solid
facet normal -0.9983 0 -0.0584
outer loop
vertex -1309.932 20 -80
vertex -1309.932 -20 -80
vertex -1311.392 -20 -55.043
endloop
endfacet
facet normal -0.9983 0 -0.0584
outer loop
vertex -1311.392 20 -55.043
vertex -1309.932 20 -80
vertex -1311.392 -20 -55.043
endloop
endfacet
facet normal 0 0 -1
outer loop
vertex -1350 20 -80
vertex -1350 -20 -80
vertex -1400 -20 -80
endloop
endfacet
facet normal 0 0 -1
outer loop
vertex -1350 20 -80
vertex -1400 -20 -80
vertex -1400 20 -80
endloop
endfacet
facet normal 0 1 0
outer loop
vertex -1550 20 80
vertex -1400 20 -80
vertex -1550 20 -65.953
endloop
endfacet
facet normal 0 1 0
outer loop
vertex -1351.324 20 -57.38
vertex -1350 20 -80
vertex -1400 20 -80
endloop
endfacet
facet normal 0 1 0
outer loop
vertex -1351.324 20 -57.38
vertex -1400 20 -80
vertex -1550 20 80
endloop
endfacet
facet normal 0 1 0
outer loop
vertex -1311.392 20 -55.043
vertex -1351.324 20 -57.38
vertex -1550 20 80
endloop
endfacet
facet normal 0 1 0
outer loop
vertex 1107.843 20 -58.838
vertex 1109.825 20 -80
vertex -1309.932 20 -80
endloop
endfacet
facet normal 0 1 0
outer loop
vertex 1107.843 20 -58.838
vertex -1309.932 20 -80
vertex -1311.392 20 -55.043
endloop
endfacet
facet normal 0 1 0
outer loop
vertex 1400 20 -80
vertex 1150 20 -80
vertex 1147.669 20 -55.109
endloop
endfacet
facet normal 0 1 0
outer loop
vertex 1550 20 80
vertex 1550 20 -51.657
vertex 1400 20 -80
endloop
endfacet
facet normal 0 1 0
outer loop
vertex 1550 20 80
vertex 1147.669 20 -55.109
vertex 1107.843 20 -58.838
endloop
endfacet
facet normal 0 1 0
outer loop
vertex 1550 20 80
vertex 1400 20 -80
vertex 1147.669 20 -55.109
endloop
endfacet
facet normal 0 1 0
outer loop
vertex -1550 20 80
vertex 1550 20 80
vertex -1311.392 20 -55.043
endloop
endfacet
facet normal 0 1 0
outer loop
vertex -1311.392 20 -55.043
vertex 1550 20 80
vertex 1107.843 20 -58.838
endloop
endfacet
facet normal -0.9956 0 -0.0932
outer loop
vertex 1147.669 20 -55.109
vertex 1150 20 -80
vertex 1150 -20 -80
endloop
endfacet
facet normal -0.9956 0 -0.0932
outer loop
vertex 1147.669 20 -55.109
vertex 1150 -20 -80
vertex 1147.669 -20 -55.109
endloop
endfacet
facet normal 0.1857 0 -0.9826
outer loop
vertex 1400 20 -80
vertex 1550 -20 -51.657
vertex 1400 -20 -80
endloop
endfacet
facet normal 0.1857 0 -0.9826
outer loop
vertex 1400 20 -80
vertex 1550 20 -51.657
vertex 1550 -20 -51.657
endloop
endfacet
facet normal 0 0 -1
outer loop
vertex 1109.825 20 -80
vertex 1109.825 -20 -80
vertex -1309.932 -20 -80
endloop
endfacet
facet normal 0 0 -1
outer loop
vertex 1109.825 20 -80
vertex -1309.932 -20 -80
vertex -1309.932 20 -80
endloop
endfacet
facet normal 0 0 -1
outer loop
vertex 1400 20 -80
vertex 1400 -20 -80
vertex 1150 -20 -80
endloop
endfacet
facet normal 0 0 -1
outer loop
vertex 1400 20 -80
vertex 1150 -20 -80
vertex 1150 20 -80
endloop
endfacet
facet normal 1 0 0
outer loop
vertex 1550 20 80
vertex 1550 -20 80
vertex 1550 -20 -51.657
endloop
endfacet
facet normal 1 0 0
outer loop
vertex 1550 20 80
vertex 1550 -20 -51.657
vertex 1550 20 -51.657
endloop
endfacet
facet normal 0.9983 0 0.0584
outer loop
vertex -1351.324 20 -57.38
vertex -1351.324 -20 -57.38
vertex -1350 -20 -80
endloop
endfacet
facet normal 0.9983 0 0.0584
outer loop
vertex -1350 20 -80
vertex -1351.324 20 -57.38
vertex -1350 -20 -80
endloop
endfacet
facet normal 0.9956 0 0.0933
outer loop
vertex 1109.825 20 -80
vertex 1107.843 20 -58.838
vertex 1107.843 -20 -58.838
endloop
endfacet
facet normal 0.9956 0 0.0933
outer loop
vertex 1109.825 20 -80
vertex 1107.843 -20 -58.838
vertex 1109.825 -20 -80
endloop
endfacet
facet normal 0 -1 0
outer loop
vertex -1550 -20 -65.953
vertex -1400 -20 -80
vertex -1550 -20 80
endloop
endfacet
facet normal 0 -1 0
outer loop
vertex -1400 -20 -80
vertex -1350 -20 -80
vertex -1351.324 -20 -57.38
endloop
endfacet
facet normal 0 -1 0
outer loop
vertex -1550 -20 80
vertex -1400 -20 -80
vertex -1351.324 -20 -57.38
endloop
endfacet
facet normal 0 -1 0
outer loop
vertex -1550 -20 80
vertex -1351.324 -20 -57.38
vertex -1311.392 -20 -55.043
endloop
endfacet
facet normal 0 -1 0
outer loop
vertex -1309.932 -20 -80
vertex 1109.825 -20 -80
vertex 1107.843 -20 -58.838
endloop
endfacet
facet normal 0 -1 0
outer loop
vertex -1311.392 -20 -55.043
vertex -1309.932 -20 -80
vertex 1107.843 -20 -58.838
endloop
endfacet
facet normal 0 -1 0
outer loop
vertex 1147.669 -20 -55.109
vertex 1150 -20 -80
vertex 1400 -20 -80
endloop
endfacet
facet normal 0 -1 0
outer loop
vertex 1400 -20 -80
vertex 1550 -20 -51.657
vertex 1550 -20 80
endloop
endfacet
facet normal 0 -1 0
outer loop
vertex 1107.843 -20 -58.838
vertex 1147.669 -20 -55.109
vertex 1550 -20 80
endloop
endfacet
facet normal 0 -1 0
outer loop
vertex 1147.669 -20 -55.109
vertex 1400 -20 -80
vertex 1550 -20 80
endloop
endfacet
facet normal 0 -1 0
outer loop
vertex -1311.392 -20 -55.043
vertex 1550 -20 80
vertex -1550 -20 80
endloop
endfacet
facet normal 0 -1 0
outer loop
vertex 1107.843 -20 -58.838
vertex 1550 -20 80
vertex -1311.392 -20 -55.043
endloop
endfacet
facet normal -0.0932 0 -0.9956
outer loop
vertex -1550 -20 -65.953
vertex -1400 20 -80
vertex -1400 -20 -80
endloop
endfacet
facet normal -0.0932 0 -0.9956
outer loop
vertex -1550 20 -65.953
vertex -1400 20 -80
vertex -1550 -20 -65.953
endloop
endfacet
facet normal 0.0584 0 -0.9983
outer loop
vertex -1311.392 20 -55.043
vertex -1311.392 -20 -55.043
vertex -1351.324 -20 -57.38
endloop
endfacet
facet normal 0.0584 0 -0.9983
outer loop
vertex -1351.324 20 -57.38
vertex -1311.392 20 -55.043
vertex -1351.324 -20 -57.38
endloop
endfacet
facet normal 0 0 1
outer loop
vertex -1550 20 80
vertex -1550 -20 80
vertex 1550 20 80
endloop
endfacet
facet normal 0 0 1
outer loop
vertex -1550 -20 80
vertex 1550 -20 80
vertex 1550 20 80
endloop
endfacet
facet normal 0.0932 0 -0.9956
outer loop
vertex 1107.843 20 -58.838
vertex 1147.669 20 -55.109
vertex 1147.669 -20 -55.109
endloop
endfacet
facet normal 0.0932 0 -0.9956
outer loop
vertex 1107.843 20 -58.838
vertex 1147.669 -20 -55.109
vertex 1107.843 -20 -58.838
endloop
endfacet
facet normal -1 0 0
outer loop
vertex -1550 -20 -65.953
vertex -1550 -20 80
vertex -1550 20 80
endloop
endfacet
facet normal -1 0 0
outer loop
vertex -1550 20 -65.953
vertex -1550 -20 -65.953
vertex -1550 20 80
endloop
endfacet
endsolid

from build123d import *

# Parameters (mm, degrees)
F1_W     = 40
F1_H     = 160
F2_DEPTH = 1550
F4_DEPTH = 50


with BuildPart() as f2:
    # F1 (on Right) → F2 (new body, symmetric)
    with BuildSketch(Plane.YZ):
        Rectangle(F1_W, F1_H)
    extrude(amount=F2_DEPTH, both=True)

    # F3 (on Front) → F4 (cut, symmetric)
    with BuildSketch(Plane.XZ):
        Polygon((1823.3880364558, -300), (1823.3880364558, 0), (1400, -80), (1400, -180), (-1400, -180), (-1400, -80), (-2254.2678682115, 0), (-2254.2678682115, -300), align=None)
        Polygon((1107.8432644326, -58.8384866727), (1109.8249860087, -80), (1150, -80), (1147.6690128529, -55.1089072373), align=None)
        Polygon((-1351.3240597547, -57.380128841), (-1350, -80), (-1309.9315310961, -80), (-1311.3924116591, -55.0427199403), align=None)
    extrude(amount=F4_DEPTH, both=True, mode=Mode.SUBTRACT)


solid = f2.part
